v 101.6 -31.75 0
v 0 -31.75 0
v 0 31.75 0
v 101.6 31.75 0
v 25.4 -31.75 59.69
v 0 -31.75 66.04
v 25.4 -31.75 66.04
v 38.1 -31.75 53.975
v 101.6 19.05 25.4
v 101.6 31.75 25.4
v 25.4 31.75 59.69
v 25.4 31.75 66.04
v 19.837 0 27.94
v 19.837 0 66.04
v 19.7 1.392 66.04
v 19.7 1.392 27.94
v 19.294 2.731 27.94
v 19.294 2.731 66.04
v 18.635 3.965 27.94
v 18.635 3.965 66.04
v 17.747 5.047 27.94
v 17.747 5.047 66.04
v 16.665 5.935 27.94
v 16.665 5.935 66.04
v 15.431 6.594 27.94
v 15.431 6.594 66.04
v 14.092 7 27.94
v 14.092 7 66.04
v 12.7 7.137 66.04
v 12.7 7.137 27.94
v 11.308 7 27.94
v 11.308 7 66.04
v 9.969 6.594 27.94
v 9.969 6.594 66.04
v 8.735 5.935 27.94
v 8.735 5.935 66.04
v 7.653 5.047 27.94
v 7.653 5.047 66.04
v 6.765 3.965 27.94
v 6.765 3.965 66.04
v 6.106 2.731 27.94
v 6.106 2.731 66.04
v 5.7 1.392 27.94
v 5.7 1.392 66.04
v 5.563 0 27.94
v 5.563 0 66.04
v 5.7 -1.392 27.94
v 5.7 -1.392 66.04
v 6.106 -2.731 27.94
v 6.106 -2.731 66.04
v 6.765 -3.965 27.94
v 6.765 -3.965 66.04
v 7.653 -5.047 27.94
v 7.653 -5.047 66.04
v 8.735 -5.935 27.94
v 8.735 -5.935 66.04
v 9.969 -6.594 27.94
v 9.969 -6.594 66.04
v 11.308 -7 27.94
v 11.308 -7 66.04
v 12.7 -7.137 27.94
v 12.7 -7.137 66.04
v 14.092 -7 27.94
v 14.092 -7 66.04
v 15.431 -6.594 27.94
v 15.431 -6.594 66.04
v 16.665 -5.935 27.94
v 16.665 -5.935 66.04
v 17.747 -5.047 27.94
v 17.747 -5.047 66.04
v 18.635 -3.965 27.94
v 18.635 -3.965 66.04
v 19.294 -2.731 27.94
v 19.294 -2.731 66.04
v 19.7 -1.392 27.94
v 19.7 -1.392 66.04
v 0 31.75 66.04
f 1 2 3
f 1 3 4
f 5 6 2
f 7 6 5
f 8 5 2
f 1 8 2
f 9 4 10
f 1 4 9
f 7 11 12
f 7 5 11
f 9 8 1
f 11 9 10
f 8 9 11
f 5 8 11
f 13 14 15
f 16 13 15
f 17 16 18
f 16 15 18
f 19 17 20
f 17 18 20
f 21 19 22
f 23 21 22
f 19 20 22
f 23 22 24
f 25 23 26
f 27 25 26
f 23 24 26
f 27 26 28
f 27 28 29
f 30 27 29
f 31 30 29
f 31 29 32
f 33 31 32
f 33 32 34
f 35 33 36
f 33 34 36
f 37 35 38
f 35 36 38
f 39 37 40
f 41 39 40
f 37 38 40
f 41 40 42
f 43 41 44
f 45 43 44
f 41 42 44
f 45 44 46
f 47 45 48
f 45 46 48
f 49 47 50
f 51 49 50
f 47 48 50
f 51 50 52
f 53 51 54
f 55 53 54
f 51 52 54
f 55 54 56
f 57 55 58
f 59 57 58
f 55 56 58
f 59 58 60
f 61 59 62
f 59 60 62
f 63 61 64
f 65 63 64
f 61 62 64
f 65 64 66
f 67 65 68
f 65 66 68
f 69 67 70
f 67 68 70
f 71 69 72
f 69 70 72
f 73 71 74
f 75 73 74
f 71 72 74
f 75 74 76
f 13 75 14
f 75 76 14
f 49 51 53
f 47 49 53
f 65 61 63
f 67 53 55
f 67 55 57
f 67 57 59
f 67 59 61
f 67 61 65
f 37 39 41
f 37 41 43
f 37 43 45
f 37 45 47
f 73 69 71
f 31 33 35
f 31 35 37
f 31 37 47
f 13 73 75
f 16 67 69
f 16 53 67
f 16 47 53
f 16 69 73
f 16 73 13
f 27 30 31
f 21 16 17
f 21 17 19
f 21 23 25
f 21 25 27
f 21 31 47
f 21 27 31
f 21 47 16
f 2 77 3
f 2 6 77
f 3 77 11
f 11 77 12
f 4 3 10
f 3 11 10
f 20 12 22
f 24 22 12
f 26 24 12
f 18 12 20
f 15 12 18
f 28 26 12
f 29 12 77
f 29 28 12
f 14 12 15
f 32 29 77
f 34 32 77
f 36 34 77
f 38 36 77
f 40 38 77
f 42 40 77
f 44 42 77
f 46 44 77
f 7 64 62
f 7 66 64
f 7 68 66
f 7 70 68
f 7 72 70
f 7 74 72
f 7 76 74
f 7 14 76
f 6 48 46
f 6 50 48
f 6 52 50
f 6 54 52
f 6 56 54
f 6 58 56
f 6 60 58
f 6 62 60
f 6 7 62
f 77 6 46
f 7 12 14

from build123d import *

# Parameters (mm, degrees)
F1_DEPTH = 31.75
F2_R     = 7.1374
F3_DEPTH = 38.1
F8_DEPTH = 47.0227251518


with BuildPart() as f1:
    # F0 (on Front) → F1 (new body, symmetric)
    with BuildSketch(Plane.XZ):
        Polygon((0, 66.04), (0, 0), (101.6, 0), (101.6, 25.4), (25.4, 59.69), (25.4, 66.04), align=None)
    extrude(amount=F1_DEPTH, both=True)

    # F2 (on face) → F3 (cut)
    with BuildSketch(Plane.XY.offset(66.04)):
        with Locations((12.7, 0)):
            Circle(F2_R)
    extrude(amount=-F3_DEPTH, mode=Mode.SUBTRACT)

    # F7 (on 3pt) → F8 (cut, through all)
    with BuildSketch(Plane(origin=(44.0556400507, -25.9150823828, 51.8301647655), x_dir=(0.79606128, 0.2706608352, -0.5413216704), z_dir=(0.6052160263, -0.3560094273, 0.7120188545))):
        Polygon((72.2863445278, -28.3980633142), (72.2863445278, 28.3980633142), (-7.4813839092, -4.2597094971), align=None)
    extrude(amount=F8_DEPTH, mode=Mode.SUBTRACT)


solid = f1.part
